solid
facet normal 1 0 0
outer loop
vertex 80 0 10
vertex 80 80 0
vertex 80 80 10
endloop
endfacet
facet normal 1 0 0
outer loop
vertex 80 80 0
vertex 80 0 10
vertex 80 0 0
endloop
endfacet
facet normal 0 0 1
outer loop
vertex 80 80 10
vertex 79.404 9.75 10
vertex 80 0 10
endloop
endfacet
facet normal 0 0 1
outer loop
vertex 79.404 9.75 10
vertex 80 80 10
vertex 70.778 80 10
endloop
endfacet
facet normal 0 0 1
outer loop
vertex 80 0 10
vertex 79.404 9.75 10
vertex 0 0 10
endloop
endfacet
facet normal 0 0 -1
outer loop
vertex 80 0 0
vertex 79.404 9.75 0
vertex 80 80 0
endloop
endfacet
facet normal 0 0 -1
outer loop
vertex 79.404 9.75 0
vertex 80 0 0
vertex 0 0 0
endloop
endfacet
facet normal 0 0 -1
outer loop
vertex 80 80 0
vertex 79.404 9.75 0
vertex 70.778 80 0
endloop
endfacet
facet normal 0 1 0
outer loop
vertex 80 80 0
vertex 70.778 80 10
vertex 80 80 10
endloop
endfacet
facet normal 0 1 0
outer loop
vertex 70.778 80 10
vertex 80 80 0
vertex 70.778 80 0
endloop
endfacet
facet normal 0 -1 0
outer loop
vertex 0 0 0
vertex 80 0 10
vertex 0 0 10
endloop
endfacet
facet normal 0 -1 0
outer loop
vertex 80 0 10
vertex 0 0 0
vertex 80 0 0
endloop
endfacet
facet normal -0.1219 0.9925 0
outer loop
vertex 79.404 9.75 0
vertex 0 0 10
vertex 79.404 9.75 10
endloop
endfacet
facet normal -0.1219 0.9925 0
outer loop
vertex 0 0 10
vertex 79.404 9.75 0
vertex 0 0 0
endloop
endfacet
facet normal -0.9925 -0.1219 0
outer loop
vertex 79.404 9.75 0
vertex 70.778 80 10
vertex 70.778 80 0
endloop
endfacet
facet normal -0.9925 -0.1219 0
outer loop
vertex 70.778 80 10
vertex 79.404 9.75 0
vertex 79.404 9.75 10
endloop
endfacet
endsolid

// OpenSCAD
module angles(angle) {
    difference() {
        cube([80,80,10]);
        rotate([0,0,angle]) {
            cube([80,80,10]);
        }
    }
}

angles(7);
